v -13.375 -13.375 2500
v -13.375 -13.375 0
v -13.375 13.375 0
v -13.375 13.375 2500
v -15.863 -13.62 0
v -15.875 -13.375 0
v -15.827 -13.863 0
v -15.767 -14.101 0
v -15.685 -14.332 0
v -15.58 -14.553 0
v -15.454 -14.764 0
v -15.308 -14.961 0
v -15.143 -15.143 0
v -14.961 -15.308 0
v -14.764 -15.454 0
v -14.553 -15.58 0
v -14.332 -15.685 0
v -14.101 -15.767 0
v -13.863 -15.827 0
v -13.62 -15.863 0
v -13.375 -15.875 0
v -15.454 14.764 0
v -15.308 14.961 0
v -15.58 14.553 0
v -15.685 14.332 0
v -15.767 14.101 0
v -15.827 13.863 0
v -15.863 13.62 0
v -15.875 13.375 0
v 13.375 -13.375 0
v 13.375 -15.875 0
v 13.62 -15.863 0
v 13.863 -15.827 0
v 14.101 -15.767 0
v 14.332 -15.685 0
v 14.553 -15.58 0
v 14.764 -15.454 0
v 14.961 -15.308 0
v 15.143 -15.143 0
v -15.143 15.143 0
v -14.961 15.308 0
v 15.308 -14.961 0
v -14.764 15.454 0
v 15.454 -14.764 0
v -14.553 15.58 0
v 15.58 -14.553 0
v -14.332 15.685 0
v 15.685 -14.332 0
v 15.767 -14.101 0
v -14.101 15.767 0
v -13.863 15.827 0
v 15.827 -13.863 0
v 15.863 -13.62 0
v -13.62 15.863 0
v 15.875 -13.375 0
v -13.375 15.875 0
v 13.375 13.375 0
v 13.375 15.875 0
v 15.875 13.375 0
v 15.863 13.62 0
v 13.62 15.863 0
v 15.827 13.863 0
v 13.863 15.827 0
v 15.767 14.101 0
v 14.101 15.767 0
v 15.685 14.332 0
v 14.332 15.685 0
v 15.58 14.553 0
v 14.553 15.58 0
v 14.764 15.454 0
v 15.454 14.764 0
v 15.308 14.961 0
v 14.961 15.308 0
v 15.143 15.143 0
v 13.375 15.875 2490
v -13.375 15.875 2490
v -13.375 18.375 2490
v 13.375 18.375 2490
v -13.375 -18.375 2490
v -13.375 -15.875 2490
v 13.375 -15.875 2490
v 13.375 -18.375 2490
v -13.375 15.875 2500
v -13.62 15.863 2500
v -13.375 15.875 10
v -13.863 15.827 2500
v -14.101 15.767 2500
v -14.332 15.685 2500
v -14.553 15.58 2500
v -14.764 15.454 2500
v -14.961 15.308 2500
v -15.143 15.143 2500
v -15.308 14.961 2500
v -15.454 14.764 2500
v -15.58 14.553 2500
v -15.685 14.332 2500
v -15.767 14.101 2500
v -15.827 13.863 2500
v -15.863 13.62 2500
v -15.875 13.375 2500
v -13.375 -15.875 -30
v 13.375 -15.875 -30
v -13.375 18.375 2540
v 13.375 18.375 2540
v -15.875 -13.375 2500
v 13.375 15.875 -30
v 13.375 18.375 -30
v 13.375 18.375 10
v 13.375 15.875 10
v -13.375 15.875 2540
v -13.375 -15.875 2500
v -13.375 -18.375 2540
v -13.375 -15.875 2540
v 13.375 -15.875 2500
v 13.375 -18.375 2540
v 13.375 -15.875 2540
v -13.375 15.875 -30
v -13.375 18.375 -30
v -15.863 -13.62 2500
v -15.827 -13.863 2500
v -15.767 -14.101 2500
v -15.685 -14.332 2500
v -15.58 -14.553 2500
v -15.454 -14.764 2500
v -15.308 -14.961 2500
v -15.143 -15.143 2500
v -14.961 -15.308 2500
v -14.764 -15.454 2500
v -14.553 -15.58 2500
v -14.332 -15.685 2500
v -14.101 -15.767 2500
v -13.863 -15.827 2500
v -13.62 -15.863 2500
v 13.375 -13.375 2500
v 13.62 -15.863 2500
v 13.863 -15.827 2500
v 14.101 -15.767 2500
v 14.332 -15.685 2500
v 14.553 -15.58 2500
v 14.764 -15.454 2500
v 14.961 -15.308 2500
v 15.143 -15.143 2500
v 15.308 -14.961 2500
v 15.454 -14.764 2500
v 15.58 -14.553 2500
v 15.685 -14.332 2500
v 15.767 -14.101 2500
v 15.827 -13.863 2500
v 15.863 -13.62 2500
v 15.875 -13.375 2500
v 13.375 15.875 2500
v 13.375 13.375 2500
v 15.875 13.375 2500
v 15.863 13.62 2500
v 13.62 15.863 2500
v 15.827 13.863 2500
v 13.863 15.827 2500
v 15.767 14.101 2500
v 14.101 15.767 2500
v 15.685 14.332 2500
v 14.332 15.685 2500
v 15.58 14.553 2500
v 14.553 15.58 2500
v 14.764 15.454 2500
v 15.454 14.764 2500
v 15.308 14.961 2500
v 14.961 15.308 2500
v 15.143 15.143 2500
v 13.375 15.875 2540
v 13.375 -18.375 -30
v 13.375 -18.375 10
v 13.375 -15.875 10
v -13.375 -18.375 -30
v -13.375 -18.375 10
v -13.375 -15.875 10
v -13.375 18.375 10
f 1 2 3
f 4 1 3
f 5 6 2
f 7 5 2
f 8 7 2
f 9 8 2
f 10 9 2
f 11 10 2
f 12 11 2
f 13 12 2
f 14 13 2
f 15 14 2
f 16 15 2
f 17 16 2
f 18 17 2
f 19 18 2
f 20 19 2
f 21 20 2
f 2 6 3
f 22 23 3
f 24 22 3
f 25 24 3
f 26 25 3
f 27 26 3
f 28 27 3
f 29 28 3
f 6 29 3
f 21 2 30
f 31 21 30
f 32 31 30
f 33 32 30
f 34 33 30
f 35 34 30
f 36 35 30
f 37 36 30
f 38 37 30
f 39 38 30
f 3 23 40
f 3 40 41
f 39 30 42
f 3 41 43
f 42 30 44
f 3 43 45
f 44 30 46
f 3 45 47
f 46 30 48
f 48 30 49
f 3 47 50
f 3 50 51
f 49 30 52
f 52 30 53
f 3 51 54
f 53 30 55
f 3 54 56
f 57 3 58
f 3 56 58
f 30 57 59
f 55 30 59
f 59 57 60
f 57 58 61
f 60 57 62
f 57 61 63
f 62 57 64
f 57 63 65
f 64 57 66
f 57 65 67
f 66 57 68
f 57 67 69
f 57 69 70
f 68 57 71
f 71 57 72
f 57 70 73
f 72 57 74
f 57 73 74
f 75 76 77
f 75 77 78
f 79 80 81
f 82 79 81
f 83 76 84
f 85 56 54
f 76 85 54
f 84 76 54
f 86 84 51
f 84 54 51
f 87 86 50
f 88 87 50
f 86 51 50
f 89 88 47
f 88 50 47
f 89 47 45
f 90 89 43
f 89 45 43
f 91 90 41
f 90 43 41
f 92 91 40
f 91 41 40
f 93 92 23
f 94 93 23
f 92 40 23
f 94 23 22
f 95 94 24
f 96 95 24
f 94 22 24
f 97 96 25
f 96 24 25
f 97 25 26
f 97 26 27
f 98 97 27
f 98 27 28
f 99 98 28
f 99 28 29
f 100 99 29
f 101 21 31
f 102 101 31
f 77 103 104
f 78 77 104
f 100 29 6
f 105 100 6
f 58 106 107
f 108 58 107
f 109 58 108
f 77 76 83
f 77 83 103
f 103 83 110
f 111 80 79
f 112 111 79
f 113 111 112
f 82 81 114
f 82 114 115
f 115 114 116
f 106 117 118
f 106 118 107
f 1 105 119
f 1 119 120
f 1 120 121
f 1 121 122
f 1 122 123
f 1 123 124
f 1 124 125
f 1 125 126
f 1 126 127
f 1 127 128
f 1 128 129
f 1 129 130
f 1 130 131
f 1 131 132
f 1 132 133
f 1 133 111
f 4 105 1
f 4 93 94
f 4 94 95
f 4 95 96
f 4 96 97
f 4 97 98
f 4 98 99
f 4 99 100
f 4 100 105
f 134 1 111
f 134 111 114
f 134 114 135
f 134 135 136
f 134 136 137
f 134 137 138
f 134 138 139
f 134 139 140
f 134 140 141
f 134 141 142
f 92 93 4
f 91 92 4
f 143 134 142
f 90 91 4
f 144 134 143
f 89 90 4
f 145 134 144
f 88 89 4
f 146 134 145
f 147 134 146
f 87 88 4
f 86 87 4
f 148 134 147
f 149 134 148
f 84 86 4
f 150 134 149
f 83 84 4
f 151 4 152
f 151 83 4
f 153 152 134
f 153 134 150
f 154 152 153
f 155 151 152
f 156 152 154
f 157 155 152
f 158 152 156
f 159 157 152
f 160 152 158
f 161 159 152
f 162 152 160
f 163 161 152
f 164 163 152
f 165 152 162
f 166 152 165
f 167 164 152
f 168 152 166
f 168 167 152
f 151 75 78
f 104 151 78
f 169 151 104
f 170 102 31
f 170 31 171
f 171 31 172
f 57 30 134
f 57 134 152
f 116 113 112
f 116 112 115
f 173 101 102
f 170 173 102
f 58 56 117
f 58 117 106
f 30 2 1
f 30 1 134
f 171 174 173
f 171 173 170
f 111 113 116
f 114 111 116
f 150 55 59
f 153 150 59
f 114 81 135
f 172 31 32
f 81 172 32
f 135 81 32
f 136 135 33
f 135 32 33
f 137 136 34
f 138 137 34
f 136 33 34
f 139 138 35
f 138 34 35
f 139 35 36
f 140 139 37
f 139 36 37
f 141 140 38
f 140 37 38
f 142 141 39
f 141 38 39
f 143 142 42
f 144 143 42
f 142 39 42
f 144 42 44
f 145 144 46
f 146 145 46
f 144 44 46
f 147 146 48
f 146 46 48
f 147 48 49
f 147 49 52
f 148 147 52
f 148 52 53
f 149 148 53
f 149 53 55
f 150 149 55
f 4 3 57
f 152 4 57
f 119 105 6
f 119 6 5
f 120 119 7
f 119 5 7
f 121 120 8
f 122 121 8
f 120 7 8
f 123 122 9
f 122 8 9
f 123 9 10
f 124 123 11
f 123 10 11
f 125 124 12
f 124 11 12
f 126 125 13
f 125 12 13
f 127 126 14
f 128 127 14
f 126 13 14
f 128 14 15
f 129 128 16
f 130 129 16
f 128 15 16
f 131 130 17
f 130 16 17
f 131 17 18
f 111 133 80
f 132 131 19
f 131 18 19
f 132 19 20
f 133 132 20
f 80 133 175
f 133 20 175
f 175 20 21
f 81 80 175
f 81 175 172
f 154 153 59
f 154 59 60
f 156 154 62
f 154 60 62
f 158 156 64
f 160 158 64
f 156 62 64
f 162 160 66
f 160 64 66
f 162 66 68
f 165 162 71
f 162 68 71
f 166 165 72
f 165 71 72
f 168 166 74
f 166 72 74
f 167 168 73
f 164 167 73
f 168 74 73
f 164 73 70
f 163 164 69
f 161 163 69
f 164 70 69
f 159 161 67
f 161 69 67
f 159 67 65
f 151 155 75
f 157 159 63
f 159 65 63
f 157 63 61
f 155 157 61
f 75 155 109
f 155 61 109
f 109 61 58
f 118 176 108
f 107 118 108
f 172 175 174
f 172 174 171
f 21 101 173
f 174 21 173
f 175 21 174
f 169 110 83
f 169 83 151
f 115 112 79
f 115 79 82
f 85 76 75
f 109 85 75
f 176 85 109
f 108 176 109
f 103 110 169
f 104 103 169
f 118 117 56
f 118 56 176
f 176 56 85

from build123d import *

# Parameters (mm, degrees)
F0_W     = 26.75
F0_H     = 26.75
F1_DEPTH = 2500
F2_W     = 26.75
F2_H     = 50
F2_H_2   = 40
F3_DEPTH = 2.5


with BuildPart() as f1:
    # F0 (on Top) → F1 (new body)
    with BuildSketch(Plane.XY):
        with BuildLine():
            ThreePointArc((15.875, 13.375), (15.142766953, 15.142766953), (13.375, 15.875))
            Line((13.375, 15.875), (-13.375, 15.875))
            ThreePointArc((-13.375, 15.875), (-15.142766953, 15.142766953), (-15.875, 13.375))
            Line((-15.875, 13.375), (-15.875, -13.375))
            ThreePointArc((-15.875, -13.375), (-15.142766953, -15.142766953), (-13.375, -15.875))
            Line((-13.375, -15.875), (13.375, -15.875))
            ThreePointArc((13.375, -15.875), (15.142766953, -15.142766953), (15.875, -13.375))
            Line((15.875, -13.375), (15.875, 13.375))
        make_face()
        Rectangle(F0_W, F0_H, mode=Mode.SUBTRACT)
    extrude(amount=F1_DEPTH)

    # F2 (on face) → F3 (join)
    with BuildSketch(Plane.XZ.offset(15.875)):
        with Locations((0, 2515)):
            Rectangle(F2_W, F2_H)
        with Locations((0, -10)):
            Rectangle(F2_W, F2_H_2)
    extrude(amount=F3_DEPTH)

    # F4: F1 across plane


with BuildPart() as f1_1:
    add(f1.part)
    add(f1.part.mirror(Plane.XZ))


solid = f1_1.part
